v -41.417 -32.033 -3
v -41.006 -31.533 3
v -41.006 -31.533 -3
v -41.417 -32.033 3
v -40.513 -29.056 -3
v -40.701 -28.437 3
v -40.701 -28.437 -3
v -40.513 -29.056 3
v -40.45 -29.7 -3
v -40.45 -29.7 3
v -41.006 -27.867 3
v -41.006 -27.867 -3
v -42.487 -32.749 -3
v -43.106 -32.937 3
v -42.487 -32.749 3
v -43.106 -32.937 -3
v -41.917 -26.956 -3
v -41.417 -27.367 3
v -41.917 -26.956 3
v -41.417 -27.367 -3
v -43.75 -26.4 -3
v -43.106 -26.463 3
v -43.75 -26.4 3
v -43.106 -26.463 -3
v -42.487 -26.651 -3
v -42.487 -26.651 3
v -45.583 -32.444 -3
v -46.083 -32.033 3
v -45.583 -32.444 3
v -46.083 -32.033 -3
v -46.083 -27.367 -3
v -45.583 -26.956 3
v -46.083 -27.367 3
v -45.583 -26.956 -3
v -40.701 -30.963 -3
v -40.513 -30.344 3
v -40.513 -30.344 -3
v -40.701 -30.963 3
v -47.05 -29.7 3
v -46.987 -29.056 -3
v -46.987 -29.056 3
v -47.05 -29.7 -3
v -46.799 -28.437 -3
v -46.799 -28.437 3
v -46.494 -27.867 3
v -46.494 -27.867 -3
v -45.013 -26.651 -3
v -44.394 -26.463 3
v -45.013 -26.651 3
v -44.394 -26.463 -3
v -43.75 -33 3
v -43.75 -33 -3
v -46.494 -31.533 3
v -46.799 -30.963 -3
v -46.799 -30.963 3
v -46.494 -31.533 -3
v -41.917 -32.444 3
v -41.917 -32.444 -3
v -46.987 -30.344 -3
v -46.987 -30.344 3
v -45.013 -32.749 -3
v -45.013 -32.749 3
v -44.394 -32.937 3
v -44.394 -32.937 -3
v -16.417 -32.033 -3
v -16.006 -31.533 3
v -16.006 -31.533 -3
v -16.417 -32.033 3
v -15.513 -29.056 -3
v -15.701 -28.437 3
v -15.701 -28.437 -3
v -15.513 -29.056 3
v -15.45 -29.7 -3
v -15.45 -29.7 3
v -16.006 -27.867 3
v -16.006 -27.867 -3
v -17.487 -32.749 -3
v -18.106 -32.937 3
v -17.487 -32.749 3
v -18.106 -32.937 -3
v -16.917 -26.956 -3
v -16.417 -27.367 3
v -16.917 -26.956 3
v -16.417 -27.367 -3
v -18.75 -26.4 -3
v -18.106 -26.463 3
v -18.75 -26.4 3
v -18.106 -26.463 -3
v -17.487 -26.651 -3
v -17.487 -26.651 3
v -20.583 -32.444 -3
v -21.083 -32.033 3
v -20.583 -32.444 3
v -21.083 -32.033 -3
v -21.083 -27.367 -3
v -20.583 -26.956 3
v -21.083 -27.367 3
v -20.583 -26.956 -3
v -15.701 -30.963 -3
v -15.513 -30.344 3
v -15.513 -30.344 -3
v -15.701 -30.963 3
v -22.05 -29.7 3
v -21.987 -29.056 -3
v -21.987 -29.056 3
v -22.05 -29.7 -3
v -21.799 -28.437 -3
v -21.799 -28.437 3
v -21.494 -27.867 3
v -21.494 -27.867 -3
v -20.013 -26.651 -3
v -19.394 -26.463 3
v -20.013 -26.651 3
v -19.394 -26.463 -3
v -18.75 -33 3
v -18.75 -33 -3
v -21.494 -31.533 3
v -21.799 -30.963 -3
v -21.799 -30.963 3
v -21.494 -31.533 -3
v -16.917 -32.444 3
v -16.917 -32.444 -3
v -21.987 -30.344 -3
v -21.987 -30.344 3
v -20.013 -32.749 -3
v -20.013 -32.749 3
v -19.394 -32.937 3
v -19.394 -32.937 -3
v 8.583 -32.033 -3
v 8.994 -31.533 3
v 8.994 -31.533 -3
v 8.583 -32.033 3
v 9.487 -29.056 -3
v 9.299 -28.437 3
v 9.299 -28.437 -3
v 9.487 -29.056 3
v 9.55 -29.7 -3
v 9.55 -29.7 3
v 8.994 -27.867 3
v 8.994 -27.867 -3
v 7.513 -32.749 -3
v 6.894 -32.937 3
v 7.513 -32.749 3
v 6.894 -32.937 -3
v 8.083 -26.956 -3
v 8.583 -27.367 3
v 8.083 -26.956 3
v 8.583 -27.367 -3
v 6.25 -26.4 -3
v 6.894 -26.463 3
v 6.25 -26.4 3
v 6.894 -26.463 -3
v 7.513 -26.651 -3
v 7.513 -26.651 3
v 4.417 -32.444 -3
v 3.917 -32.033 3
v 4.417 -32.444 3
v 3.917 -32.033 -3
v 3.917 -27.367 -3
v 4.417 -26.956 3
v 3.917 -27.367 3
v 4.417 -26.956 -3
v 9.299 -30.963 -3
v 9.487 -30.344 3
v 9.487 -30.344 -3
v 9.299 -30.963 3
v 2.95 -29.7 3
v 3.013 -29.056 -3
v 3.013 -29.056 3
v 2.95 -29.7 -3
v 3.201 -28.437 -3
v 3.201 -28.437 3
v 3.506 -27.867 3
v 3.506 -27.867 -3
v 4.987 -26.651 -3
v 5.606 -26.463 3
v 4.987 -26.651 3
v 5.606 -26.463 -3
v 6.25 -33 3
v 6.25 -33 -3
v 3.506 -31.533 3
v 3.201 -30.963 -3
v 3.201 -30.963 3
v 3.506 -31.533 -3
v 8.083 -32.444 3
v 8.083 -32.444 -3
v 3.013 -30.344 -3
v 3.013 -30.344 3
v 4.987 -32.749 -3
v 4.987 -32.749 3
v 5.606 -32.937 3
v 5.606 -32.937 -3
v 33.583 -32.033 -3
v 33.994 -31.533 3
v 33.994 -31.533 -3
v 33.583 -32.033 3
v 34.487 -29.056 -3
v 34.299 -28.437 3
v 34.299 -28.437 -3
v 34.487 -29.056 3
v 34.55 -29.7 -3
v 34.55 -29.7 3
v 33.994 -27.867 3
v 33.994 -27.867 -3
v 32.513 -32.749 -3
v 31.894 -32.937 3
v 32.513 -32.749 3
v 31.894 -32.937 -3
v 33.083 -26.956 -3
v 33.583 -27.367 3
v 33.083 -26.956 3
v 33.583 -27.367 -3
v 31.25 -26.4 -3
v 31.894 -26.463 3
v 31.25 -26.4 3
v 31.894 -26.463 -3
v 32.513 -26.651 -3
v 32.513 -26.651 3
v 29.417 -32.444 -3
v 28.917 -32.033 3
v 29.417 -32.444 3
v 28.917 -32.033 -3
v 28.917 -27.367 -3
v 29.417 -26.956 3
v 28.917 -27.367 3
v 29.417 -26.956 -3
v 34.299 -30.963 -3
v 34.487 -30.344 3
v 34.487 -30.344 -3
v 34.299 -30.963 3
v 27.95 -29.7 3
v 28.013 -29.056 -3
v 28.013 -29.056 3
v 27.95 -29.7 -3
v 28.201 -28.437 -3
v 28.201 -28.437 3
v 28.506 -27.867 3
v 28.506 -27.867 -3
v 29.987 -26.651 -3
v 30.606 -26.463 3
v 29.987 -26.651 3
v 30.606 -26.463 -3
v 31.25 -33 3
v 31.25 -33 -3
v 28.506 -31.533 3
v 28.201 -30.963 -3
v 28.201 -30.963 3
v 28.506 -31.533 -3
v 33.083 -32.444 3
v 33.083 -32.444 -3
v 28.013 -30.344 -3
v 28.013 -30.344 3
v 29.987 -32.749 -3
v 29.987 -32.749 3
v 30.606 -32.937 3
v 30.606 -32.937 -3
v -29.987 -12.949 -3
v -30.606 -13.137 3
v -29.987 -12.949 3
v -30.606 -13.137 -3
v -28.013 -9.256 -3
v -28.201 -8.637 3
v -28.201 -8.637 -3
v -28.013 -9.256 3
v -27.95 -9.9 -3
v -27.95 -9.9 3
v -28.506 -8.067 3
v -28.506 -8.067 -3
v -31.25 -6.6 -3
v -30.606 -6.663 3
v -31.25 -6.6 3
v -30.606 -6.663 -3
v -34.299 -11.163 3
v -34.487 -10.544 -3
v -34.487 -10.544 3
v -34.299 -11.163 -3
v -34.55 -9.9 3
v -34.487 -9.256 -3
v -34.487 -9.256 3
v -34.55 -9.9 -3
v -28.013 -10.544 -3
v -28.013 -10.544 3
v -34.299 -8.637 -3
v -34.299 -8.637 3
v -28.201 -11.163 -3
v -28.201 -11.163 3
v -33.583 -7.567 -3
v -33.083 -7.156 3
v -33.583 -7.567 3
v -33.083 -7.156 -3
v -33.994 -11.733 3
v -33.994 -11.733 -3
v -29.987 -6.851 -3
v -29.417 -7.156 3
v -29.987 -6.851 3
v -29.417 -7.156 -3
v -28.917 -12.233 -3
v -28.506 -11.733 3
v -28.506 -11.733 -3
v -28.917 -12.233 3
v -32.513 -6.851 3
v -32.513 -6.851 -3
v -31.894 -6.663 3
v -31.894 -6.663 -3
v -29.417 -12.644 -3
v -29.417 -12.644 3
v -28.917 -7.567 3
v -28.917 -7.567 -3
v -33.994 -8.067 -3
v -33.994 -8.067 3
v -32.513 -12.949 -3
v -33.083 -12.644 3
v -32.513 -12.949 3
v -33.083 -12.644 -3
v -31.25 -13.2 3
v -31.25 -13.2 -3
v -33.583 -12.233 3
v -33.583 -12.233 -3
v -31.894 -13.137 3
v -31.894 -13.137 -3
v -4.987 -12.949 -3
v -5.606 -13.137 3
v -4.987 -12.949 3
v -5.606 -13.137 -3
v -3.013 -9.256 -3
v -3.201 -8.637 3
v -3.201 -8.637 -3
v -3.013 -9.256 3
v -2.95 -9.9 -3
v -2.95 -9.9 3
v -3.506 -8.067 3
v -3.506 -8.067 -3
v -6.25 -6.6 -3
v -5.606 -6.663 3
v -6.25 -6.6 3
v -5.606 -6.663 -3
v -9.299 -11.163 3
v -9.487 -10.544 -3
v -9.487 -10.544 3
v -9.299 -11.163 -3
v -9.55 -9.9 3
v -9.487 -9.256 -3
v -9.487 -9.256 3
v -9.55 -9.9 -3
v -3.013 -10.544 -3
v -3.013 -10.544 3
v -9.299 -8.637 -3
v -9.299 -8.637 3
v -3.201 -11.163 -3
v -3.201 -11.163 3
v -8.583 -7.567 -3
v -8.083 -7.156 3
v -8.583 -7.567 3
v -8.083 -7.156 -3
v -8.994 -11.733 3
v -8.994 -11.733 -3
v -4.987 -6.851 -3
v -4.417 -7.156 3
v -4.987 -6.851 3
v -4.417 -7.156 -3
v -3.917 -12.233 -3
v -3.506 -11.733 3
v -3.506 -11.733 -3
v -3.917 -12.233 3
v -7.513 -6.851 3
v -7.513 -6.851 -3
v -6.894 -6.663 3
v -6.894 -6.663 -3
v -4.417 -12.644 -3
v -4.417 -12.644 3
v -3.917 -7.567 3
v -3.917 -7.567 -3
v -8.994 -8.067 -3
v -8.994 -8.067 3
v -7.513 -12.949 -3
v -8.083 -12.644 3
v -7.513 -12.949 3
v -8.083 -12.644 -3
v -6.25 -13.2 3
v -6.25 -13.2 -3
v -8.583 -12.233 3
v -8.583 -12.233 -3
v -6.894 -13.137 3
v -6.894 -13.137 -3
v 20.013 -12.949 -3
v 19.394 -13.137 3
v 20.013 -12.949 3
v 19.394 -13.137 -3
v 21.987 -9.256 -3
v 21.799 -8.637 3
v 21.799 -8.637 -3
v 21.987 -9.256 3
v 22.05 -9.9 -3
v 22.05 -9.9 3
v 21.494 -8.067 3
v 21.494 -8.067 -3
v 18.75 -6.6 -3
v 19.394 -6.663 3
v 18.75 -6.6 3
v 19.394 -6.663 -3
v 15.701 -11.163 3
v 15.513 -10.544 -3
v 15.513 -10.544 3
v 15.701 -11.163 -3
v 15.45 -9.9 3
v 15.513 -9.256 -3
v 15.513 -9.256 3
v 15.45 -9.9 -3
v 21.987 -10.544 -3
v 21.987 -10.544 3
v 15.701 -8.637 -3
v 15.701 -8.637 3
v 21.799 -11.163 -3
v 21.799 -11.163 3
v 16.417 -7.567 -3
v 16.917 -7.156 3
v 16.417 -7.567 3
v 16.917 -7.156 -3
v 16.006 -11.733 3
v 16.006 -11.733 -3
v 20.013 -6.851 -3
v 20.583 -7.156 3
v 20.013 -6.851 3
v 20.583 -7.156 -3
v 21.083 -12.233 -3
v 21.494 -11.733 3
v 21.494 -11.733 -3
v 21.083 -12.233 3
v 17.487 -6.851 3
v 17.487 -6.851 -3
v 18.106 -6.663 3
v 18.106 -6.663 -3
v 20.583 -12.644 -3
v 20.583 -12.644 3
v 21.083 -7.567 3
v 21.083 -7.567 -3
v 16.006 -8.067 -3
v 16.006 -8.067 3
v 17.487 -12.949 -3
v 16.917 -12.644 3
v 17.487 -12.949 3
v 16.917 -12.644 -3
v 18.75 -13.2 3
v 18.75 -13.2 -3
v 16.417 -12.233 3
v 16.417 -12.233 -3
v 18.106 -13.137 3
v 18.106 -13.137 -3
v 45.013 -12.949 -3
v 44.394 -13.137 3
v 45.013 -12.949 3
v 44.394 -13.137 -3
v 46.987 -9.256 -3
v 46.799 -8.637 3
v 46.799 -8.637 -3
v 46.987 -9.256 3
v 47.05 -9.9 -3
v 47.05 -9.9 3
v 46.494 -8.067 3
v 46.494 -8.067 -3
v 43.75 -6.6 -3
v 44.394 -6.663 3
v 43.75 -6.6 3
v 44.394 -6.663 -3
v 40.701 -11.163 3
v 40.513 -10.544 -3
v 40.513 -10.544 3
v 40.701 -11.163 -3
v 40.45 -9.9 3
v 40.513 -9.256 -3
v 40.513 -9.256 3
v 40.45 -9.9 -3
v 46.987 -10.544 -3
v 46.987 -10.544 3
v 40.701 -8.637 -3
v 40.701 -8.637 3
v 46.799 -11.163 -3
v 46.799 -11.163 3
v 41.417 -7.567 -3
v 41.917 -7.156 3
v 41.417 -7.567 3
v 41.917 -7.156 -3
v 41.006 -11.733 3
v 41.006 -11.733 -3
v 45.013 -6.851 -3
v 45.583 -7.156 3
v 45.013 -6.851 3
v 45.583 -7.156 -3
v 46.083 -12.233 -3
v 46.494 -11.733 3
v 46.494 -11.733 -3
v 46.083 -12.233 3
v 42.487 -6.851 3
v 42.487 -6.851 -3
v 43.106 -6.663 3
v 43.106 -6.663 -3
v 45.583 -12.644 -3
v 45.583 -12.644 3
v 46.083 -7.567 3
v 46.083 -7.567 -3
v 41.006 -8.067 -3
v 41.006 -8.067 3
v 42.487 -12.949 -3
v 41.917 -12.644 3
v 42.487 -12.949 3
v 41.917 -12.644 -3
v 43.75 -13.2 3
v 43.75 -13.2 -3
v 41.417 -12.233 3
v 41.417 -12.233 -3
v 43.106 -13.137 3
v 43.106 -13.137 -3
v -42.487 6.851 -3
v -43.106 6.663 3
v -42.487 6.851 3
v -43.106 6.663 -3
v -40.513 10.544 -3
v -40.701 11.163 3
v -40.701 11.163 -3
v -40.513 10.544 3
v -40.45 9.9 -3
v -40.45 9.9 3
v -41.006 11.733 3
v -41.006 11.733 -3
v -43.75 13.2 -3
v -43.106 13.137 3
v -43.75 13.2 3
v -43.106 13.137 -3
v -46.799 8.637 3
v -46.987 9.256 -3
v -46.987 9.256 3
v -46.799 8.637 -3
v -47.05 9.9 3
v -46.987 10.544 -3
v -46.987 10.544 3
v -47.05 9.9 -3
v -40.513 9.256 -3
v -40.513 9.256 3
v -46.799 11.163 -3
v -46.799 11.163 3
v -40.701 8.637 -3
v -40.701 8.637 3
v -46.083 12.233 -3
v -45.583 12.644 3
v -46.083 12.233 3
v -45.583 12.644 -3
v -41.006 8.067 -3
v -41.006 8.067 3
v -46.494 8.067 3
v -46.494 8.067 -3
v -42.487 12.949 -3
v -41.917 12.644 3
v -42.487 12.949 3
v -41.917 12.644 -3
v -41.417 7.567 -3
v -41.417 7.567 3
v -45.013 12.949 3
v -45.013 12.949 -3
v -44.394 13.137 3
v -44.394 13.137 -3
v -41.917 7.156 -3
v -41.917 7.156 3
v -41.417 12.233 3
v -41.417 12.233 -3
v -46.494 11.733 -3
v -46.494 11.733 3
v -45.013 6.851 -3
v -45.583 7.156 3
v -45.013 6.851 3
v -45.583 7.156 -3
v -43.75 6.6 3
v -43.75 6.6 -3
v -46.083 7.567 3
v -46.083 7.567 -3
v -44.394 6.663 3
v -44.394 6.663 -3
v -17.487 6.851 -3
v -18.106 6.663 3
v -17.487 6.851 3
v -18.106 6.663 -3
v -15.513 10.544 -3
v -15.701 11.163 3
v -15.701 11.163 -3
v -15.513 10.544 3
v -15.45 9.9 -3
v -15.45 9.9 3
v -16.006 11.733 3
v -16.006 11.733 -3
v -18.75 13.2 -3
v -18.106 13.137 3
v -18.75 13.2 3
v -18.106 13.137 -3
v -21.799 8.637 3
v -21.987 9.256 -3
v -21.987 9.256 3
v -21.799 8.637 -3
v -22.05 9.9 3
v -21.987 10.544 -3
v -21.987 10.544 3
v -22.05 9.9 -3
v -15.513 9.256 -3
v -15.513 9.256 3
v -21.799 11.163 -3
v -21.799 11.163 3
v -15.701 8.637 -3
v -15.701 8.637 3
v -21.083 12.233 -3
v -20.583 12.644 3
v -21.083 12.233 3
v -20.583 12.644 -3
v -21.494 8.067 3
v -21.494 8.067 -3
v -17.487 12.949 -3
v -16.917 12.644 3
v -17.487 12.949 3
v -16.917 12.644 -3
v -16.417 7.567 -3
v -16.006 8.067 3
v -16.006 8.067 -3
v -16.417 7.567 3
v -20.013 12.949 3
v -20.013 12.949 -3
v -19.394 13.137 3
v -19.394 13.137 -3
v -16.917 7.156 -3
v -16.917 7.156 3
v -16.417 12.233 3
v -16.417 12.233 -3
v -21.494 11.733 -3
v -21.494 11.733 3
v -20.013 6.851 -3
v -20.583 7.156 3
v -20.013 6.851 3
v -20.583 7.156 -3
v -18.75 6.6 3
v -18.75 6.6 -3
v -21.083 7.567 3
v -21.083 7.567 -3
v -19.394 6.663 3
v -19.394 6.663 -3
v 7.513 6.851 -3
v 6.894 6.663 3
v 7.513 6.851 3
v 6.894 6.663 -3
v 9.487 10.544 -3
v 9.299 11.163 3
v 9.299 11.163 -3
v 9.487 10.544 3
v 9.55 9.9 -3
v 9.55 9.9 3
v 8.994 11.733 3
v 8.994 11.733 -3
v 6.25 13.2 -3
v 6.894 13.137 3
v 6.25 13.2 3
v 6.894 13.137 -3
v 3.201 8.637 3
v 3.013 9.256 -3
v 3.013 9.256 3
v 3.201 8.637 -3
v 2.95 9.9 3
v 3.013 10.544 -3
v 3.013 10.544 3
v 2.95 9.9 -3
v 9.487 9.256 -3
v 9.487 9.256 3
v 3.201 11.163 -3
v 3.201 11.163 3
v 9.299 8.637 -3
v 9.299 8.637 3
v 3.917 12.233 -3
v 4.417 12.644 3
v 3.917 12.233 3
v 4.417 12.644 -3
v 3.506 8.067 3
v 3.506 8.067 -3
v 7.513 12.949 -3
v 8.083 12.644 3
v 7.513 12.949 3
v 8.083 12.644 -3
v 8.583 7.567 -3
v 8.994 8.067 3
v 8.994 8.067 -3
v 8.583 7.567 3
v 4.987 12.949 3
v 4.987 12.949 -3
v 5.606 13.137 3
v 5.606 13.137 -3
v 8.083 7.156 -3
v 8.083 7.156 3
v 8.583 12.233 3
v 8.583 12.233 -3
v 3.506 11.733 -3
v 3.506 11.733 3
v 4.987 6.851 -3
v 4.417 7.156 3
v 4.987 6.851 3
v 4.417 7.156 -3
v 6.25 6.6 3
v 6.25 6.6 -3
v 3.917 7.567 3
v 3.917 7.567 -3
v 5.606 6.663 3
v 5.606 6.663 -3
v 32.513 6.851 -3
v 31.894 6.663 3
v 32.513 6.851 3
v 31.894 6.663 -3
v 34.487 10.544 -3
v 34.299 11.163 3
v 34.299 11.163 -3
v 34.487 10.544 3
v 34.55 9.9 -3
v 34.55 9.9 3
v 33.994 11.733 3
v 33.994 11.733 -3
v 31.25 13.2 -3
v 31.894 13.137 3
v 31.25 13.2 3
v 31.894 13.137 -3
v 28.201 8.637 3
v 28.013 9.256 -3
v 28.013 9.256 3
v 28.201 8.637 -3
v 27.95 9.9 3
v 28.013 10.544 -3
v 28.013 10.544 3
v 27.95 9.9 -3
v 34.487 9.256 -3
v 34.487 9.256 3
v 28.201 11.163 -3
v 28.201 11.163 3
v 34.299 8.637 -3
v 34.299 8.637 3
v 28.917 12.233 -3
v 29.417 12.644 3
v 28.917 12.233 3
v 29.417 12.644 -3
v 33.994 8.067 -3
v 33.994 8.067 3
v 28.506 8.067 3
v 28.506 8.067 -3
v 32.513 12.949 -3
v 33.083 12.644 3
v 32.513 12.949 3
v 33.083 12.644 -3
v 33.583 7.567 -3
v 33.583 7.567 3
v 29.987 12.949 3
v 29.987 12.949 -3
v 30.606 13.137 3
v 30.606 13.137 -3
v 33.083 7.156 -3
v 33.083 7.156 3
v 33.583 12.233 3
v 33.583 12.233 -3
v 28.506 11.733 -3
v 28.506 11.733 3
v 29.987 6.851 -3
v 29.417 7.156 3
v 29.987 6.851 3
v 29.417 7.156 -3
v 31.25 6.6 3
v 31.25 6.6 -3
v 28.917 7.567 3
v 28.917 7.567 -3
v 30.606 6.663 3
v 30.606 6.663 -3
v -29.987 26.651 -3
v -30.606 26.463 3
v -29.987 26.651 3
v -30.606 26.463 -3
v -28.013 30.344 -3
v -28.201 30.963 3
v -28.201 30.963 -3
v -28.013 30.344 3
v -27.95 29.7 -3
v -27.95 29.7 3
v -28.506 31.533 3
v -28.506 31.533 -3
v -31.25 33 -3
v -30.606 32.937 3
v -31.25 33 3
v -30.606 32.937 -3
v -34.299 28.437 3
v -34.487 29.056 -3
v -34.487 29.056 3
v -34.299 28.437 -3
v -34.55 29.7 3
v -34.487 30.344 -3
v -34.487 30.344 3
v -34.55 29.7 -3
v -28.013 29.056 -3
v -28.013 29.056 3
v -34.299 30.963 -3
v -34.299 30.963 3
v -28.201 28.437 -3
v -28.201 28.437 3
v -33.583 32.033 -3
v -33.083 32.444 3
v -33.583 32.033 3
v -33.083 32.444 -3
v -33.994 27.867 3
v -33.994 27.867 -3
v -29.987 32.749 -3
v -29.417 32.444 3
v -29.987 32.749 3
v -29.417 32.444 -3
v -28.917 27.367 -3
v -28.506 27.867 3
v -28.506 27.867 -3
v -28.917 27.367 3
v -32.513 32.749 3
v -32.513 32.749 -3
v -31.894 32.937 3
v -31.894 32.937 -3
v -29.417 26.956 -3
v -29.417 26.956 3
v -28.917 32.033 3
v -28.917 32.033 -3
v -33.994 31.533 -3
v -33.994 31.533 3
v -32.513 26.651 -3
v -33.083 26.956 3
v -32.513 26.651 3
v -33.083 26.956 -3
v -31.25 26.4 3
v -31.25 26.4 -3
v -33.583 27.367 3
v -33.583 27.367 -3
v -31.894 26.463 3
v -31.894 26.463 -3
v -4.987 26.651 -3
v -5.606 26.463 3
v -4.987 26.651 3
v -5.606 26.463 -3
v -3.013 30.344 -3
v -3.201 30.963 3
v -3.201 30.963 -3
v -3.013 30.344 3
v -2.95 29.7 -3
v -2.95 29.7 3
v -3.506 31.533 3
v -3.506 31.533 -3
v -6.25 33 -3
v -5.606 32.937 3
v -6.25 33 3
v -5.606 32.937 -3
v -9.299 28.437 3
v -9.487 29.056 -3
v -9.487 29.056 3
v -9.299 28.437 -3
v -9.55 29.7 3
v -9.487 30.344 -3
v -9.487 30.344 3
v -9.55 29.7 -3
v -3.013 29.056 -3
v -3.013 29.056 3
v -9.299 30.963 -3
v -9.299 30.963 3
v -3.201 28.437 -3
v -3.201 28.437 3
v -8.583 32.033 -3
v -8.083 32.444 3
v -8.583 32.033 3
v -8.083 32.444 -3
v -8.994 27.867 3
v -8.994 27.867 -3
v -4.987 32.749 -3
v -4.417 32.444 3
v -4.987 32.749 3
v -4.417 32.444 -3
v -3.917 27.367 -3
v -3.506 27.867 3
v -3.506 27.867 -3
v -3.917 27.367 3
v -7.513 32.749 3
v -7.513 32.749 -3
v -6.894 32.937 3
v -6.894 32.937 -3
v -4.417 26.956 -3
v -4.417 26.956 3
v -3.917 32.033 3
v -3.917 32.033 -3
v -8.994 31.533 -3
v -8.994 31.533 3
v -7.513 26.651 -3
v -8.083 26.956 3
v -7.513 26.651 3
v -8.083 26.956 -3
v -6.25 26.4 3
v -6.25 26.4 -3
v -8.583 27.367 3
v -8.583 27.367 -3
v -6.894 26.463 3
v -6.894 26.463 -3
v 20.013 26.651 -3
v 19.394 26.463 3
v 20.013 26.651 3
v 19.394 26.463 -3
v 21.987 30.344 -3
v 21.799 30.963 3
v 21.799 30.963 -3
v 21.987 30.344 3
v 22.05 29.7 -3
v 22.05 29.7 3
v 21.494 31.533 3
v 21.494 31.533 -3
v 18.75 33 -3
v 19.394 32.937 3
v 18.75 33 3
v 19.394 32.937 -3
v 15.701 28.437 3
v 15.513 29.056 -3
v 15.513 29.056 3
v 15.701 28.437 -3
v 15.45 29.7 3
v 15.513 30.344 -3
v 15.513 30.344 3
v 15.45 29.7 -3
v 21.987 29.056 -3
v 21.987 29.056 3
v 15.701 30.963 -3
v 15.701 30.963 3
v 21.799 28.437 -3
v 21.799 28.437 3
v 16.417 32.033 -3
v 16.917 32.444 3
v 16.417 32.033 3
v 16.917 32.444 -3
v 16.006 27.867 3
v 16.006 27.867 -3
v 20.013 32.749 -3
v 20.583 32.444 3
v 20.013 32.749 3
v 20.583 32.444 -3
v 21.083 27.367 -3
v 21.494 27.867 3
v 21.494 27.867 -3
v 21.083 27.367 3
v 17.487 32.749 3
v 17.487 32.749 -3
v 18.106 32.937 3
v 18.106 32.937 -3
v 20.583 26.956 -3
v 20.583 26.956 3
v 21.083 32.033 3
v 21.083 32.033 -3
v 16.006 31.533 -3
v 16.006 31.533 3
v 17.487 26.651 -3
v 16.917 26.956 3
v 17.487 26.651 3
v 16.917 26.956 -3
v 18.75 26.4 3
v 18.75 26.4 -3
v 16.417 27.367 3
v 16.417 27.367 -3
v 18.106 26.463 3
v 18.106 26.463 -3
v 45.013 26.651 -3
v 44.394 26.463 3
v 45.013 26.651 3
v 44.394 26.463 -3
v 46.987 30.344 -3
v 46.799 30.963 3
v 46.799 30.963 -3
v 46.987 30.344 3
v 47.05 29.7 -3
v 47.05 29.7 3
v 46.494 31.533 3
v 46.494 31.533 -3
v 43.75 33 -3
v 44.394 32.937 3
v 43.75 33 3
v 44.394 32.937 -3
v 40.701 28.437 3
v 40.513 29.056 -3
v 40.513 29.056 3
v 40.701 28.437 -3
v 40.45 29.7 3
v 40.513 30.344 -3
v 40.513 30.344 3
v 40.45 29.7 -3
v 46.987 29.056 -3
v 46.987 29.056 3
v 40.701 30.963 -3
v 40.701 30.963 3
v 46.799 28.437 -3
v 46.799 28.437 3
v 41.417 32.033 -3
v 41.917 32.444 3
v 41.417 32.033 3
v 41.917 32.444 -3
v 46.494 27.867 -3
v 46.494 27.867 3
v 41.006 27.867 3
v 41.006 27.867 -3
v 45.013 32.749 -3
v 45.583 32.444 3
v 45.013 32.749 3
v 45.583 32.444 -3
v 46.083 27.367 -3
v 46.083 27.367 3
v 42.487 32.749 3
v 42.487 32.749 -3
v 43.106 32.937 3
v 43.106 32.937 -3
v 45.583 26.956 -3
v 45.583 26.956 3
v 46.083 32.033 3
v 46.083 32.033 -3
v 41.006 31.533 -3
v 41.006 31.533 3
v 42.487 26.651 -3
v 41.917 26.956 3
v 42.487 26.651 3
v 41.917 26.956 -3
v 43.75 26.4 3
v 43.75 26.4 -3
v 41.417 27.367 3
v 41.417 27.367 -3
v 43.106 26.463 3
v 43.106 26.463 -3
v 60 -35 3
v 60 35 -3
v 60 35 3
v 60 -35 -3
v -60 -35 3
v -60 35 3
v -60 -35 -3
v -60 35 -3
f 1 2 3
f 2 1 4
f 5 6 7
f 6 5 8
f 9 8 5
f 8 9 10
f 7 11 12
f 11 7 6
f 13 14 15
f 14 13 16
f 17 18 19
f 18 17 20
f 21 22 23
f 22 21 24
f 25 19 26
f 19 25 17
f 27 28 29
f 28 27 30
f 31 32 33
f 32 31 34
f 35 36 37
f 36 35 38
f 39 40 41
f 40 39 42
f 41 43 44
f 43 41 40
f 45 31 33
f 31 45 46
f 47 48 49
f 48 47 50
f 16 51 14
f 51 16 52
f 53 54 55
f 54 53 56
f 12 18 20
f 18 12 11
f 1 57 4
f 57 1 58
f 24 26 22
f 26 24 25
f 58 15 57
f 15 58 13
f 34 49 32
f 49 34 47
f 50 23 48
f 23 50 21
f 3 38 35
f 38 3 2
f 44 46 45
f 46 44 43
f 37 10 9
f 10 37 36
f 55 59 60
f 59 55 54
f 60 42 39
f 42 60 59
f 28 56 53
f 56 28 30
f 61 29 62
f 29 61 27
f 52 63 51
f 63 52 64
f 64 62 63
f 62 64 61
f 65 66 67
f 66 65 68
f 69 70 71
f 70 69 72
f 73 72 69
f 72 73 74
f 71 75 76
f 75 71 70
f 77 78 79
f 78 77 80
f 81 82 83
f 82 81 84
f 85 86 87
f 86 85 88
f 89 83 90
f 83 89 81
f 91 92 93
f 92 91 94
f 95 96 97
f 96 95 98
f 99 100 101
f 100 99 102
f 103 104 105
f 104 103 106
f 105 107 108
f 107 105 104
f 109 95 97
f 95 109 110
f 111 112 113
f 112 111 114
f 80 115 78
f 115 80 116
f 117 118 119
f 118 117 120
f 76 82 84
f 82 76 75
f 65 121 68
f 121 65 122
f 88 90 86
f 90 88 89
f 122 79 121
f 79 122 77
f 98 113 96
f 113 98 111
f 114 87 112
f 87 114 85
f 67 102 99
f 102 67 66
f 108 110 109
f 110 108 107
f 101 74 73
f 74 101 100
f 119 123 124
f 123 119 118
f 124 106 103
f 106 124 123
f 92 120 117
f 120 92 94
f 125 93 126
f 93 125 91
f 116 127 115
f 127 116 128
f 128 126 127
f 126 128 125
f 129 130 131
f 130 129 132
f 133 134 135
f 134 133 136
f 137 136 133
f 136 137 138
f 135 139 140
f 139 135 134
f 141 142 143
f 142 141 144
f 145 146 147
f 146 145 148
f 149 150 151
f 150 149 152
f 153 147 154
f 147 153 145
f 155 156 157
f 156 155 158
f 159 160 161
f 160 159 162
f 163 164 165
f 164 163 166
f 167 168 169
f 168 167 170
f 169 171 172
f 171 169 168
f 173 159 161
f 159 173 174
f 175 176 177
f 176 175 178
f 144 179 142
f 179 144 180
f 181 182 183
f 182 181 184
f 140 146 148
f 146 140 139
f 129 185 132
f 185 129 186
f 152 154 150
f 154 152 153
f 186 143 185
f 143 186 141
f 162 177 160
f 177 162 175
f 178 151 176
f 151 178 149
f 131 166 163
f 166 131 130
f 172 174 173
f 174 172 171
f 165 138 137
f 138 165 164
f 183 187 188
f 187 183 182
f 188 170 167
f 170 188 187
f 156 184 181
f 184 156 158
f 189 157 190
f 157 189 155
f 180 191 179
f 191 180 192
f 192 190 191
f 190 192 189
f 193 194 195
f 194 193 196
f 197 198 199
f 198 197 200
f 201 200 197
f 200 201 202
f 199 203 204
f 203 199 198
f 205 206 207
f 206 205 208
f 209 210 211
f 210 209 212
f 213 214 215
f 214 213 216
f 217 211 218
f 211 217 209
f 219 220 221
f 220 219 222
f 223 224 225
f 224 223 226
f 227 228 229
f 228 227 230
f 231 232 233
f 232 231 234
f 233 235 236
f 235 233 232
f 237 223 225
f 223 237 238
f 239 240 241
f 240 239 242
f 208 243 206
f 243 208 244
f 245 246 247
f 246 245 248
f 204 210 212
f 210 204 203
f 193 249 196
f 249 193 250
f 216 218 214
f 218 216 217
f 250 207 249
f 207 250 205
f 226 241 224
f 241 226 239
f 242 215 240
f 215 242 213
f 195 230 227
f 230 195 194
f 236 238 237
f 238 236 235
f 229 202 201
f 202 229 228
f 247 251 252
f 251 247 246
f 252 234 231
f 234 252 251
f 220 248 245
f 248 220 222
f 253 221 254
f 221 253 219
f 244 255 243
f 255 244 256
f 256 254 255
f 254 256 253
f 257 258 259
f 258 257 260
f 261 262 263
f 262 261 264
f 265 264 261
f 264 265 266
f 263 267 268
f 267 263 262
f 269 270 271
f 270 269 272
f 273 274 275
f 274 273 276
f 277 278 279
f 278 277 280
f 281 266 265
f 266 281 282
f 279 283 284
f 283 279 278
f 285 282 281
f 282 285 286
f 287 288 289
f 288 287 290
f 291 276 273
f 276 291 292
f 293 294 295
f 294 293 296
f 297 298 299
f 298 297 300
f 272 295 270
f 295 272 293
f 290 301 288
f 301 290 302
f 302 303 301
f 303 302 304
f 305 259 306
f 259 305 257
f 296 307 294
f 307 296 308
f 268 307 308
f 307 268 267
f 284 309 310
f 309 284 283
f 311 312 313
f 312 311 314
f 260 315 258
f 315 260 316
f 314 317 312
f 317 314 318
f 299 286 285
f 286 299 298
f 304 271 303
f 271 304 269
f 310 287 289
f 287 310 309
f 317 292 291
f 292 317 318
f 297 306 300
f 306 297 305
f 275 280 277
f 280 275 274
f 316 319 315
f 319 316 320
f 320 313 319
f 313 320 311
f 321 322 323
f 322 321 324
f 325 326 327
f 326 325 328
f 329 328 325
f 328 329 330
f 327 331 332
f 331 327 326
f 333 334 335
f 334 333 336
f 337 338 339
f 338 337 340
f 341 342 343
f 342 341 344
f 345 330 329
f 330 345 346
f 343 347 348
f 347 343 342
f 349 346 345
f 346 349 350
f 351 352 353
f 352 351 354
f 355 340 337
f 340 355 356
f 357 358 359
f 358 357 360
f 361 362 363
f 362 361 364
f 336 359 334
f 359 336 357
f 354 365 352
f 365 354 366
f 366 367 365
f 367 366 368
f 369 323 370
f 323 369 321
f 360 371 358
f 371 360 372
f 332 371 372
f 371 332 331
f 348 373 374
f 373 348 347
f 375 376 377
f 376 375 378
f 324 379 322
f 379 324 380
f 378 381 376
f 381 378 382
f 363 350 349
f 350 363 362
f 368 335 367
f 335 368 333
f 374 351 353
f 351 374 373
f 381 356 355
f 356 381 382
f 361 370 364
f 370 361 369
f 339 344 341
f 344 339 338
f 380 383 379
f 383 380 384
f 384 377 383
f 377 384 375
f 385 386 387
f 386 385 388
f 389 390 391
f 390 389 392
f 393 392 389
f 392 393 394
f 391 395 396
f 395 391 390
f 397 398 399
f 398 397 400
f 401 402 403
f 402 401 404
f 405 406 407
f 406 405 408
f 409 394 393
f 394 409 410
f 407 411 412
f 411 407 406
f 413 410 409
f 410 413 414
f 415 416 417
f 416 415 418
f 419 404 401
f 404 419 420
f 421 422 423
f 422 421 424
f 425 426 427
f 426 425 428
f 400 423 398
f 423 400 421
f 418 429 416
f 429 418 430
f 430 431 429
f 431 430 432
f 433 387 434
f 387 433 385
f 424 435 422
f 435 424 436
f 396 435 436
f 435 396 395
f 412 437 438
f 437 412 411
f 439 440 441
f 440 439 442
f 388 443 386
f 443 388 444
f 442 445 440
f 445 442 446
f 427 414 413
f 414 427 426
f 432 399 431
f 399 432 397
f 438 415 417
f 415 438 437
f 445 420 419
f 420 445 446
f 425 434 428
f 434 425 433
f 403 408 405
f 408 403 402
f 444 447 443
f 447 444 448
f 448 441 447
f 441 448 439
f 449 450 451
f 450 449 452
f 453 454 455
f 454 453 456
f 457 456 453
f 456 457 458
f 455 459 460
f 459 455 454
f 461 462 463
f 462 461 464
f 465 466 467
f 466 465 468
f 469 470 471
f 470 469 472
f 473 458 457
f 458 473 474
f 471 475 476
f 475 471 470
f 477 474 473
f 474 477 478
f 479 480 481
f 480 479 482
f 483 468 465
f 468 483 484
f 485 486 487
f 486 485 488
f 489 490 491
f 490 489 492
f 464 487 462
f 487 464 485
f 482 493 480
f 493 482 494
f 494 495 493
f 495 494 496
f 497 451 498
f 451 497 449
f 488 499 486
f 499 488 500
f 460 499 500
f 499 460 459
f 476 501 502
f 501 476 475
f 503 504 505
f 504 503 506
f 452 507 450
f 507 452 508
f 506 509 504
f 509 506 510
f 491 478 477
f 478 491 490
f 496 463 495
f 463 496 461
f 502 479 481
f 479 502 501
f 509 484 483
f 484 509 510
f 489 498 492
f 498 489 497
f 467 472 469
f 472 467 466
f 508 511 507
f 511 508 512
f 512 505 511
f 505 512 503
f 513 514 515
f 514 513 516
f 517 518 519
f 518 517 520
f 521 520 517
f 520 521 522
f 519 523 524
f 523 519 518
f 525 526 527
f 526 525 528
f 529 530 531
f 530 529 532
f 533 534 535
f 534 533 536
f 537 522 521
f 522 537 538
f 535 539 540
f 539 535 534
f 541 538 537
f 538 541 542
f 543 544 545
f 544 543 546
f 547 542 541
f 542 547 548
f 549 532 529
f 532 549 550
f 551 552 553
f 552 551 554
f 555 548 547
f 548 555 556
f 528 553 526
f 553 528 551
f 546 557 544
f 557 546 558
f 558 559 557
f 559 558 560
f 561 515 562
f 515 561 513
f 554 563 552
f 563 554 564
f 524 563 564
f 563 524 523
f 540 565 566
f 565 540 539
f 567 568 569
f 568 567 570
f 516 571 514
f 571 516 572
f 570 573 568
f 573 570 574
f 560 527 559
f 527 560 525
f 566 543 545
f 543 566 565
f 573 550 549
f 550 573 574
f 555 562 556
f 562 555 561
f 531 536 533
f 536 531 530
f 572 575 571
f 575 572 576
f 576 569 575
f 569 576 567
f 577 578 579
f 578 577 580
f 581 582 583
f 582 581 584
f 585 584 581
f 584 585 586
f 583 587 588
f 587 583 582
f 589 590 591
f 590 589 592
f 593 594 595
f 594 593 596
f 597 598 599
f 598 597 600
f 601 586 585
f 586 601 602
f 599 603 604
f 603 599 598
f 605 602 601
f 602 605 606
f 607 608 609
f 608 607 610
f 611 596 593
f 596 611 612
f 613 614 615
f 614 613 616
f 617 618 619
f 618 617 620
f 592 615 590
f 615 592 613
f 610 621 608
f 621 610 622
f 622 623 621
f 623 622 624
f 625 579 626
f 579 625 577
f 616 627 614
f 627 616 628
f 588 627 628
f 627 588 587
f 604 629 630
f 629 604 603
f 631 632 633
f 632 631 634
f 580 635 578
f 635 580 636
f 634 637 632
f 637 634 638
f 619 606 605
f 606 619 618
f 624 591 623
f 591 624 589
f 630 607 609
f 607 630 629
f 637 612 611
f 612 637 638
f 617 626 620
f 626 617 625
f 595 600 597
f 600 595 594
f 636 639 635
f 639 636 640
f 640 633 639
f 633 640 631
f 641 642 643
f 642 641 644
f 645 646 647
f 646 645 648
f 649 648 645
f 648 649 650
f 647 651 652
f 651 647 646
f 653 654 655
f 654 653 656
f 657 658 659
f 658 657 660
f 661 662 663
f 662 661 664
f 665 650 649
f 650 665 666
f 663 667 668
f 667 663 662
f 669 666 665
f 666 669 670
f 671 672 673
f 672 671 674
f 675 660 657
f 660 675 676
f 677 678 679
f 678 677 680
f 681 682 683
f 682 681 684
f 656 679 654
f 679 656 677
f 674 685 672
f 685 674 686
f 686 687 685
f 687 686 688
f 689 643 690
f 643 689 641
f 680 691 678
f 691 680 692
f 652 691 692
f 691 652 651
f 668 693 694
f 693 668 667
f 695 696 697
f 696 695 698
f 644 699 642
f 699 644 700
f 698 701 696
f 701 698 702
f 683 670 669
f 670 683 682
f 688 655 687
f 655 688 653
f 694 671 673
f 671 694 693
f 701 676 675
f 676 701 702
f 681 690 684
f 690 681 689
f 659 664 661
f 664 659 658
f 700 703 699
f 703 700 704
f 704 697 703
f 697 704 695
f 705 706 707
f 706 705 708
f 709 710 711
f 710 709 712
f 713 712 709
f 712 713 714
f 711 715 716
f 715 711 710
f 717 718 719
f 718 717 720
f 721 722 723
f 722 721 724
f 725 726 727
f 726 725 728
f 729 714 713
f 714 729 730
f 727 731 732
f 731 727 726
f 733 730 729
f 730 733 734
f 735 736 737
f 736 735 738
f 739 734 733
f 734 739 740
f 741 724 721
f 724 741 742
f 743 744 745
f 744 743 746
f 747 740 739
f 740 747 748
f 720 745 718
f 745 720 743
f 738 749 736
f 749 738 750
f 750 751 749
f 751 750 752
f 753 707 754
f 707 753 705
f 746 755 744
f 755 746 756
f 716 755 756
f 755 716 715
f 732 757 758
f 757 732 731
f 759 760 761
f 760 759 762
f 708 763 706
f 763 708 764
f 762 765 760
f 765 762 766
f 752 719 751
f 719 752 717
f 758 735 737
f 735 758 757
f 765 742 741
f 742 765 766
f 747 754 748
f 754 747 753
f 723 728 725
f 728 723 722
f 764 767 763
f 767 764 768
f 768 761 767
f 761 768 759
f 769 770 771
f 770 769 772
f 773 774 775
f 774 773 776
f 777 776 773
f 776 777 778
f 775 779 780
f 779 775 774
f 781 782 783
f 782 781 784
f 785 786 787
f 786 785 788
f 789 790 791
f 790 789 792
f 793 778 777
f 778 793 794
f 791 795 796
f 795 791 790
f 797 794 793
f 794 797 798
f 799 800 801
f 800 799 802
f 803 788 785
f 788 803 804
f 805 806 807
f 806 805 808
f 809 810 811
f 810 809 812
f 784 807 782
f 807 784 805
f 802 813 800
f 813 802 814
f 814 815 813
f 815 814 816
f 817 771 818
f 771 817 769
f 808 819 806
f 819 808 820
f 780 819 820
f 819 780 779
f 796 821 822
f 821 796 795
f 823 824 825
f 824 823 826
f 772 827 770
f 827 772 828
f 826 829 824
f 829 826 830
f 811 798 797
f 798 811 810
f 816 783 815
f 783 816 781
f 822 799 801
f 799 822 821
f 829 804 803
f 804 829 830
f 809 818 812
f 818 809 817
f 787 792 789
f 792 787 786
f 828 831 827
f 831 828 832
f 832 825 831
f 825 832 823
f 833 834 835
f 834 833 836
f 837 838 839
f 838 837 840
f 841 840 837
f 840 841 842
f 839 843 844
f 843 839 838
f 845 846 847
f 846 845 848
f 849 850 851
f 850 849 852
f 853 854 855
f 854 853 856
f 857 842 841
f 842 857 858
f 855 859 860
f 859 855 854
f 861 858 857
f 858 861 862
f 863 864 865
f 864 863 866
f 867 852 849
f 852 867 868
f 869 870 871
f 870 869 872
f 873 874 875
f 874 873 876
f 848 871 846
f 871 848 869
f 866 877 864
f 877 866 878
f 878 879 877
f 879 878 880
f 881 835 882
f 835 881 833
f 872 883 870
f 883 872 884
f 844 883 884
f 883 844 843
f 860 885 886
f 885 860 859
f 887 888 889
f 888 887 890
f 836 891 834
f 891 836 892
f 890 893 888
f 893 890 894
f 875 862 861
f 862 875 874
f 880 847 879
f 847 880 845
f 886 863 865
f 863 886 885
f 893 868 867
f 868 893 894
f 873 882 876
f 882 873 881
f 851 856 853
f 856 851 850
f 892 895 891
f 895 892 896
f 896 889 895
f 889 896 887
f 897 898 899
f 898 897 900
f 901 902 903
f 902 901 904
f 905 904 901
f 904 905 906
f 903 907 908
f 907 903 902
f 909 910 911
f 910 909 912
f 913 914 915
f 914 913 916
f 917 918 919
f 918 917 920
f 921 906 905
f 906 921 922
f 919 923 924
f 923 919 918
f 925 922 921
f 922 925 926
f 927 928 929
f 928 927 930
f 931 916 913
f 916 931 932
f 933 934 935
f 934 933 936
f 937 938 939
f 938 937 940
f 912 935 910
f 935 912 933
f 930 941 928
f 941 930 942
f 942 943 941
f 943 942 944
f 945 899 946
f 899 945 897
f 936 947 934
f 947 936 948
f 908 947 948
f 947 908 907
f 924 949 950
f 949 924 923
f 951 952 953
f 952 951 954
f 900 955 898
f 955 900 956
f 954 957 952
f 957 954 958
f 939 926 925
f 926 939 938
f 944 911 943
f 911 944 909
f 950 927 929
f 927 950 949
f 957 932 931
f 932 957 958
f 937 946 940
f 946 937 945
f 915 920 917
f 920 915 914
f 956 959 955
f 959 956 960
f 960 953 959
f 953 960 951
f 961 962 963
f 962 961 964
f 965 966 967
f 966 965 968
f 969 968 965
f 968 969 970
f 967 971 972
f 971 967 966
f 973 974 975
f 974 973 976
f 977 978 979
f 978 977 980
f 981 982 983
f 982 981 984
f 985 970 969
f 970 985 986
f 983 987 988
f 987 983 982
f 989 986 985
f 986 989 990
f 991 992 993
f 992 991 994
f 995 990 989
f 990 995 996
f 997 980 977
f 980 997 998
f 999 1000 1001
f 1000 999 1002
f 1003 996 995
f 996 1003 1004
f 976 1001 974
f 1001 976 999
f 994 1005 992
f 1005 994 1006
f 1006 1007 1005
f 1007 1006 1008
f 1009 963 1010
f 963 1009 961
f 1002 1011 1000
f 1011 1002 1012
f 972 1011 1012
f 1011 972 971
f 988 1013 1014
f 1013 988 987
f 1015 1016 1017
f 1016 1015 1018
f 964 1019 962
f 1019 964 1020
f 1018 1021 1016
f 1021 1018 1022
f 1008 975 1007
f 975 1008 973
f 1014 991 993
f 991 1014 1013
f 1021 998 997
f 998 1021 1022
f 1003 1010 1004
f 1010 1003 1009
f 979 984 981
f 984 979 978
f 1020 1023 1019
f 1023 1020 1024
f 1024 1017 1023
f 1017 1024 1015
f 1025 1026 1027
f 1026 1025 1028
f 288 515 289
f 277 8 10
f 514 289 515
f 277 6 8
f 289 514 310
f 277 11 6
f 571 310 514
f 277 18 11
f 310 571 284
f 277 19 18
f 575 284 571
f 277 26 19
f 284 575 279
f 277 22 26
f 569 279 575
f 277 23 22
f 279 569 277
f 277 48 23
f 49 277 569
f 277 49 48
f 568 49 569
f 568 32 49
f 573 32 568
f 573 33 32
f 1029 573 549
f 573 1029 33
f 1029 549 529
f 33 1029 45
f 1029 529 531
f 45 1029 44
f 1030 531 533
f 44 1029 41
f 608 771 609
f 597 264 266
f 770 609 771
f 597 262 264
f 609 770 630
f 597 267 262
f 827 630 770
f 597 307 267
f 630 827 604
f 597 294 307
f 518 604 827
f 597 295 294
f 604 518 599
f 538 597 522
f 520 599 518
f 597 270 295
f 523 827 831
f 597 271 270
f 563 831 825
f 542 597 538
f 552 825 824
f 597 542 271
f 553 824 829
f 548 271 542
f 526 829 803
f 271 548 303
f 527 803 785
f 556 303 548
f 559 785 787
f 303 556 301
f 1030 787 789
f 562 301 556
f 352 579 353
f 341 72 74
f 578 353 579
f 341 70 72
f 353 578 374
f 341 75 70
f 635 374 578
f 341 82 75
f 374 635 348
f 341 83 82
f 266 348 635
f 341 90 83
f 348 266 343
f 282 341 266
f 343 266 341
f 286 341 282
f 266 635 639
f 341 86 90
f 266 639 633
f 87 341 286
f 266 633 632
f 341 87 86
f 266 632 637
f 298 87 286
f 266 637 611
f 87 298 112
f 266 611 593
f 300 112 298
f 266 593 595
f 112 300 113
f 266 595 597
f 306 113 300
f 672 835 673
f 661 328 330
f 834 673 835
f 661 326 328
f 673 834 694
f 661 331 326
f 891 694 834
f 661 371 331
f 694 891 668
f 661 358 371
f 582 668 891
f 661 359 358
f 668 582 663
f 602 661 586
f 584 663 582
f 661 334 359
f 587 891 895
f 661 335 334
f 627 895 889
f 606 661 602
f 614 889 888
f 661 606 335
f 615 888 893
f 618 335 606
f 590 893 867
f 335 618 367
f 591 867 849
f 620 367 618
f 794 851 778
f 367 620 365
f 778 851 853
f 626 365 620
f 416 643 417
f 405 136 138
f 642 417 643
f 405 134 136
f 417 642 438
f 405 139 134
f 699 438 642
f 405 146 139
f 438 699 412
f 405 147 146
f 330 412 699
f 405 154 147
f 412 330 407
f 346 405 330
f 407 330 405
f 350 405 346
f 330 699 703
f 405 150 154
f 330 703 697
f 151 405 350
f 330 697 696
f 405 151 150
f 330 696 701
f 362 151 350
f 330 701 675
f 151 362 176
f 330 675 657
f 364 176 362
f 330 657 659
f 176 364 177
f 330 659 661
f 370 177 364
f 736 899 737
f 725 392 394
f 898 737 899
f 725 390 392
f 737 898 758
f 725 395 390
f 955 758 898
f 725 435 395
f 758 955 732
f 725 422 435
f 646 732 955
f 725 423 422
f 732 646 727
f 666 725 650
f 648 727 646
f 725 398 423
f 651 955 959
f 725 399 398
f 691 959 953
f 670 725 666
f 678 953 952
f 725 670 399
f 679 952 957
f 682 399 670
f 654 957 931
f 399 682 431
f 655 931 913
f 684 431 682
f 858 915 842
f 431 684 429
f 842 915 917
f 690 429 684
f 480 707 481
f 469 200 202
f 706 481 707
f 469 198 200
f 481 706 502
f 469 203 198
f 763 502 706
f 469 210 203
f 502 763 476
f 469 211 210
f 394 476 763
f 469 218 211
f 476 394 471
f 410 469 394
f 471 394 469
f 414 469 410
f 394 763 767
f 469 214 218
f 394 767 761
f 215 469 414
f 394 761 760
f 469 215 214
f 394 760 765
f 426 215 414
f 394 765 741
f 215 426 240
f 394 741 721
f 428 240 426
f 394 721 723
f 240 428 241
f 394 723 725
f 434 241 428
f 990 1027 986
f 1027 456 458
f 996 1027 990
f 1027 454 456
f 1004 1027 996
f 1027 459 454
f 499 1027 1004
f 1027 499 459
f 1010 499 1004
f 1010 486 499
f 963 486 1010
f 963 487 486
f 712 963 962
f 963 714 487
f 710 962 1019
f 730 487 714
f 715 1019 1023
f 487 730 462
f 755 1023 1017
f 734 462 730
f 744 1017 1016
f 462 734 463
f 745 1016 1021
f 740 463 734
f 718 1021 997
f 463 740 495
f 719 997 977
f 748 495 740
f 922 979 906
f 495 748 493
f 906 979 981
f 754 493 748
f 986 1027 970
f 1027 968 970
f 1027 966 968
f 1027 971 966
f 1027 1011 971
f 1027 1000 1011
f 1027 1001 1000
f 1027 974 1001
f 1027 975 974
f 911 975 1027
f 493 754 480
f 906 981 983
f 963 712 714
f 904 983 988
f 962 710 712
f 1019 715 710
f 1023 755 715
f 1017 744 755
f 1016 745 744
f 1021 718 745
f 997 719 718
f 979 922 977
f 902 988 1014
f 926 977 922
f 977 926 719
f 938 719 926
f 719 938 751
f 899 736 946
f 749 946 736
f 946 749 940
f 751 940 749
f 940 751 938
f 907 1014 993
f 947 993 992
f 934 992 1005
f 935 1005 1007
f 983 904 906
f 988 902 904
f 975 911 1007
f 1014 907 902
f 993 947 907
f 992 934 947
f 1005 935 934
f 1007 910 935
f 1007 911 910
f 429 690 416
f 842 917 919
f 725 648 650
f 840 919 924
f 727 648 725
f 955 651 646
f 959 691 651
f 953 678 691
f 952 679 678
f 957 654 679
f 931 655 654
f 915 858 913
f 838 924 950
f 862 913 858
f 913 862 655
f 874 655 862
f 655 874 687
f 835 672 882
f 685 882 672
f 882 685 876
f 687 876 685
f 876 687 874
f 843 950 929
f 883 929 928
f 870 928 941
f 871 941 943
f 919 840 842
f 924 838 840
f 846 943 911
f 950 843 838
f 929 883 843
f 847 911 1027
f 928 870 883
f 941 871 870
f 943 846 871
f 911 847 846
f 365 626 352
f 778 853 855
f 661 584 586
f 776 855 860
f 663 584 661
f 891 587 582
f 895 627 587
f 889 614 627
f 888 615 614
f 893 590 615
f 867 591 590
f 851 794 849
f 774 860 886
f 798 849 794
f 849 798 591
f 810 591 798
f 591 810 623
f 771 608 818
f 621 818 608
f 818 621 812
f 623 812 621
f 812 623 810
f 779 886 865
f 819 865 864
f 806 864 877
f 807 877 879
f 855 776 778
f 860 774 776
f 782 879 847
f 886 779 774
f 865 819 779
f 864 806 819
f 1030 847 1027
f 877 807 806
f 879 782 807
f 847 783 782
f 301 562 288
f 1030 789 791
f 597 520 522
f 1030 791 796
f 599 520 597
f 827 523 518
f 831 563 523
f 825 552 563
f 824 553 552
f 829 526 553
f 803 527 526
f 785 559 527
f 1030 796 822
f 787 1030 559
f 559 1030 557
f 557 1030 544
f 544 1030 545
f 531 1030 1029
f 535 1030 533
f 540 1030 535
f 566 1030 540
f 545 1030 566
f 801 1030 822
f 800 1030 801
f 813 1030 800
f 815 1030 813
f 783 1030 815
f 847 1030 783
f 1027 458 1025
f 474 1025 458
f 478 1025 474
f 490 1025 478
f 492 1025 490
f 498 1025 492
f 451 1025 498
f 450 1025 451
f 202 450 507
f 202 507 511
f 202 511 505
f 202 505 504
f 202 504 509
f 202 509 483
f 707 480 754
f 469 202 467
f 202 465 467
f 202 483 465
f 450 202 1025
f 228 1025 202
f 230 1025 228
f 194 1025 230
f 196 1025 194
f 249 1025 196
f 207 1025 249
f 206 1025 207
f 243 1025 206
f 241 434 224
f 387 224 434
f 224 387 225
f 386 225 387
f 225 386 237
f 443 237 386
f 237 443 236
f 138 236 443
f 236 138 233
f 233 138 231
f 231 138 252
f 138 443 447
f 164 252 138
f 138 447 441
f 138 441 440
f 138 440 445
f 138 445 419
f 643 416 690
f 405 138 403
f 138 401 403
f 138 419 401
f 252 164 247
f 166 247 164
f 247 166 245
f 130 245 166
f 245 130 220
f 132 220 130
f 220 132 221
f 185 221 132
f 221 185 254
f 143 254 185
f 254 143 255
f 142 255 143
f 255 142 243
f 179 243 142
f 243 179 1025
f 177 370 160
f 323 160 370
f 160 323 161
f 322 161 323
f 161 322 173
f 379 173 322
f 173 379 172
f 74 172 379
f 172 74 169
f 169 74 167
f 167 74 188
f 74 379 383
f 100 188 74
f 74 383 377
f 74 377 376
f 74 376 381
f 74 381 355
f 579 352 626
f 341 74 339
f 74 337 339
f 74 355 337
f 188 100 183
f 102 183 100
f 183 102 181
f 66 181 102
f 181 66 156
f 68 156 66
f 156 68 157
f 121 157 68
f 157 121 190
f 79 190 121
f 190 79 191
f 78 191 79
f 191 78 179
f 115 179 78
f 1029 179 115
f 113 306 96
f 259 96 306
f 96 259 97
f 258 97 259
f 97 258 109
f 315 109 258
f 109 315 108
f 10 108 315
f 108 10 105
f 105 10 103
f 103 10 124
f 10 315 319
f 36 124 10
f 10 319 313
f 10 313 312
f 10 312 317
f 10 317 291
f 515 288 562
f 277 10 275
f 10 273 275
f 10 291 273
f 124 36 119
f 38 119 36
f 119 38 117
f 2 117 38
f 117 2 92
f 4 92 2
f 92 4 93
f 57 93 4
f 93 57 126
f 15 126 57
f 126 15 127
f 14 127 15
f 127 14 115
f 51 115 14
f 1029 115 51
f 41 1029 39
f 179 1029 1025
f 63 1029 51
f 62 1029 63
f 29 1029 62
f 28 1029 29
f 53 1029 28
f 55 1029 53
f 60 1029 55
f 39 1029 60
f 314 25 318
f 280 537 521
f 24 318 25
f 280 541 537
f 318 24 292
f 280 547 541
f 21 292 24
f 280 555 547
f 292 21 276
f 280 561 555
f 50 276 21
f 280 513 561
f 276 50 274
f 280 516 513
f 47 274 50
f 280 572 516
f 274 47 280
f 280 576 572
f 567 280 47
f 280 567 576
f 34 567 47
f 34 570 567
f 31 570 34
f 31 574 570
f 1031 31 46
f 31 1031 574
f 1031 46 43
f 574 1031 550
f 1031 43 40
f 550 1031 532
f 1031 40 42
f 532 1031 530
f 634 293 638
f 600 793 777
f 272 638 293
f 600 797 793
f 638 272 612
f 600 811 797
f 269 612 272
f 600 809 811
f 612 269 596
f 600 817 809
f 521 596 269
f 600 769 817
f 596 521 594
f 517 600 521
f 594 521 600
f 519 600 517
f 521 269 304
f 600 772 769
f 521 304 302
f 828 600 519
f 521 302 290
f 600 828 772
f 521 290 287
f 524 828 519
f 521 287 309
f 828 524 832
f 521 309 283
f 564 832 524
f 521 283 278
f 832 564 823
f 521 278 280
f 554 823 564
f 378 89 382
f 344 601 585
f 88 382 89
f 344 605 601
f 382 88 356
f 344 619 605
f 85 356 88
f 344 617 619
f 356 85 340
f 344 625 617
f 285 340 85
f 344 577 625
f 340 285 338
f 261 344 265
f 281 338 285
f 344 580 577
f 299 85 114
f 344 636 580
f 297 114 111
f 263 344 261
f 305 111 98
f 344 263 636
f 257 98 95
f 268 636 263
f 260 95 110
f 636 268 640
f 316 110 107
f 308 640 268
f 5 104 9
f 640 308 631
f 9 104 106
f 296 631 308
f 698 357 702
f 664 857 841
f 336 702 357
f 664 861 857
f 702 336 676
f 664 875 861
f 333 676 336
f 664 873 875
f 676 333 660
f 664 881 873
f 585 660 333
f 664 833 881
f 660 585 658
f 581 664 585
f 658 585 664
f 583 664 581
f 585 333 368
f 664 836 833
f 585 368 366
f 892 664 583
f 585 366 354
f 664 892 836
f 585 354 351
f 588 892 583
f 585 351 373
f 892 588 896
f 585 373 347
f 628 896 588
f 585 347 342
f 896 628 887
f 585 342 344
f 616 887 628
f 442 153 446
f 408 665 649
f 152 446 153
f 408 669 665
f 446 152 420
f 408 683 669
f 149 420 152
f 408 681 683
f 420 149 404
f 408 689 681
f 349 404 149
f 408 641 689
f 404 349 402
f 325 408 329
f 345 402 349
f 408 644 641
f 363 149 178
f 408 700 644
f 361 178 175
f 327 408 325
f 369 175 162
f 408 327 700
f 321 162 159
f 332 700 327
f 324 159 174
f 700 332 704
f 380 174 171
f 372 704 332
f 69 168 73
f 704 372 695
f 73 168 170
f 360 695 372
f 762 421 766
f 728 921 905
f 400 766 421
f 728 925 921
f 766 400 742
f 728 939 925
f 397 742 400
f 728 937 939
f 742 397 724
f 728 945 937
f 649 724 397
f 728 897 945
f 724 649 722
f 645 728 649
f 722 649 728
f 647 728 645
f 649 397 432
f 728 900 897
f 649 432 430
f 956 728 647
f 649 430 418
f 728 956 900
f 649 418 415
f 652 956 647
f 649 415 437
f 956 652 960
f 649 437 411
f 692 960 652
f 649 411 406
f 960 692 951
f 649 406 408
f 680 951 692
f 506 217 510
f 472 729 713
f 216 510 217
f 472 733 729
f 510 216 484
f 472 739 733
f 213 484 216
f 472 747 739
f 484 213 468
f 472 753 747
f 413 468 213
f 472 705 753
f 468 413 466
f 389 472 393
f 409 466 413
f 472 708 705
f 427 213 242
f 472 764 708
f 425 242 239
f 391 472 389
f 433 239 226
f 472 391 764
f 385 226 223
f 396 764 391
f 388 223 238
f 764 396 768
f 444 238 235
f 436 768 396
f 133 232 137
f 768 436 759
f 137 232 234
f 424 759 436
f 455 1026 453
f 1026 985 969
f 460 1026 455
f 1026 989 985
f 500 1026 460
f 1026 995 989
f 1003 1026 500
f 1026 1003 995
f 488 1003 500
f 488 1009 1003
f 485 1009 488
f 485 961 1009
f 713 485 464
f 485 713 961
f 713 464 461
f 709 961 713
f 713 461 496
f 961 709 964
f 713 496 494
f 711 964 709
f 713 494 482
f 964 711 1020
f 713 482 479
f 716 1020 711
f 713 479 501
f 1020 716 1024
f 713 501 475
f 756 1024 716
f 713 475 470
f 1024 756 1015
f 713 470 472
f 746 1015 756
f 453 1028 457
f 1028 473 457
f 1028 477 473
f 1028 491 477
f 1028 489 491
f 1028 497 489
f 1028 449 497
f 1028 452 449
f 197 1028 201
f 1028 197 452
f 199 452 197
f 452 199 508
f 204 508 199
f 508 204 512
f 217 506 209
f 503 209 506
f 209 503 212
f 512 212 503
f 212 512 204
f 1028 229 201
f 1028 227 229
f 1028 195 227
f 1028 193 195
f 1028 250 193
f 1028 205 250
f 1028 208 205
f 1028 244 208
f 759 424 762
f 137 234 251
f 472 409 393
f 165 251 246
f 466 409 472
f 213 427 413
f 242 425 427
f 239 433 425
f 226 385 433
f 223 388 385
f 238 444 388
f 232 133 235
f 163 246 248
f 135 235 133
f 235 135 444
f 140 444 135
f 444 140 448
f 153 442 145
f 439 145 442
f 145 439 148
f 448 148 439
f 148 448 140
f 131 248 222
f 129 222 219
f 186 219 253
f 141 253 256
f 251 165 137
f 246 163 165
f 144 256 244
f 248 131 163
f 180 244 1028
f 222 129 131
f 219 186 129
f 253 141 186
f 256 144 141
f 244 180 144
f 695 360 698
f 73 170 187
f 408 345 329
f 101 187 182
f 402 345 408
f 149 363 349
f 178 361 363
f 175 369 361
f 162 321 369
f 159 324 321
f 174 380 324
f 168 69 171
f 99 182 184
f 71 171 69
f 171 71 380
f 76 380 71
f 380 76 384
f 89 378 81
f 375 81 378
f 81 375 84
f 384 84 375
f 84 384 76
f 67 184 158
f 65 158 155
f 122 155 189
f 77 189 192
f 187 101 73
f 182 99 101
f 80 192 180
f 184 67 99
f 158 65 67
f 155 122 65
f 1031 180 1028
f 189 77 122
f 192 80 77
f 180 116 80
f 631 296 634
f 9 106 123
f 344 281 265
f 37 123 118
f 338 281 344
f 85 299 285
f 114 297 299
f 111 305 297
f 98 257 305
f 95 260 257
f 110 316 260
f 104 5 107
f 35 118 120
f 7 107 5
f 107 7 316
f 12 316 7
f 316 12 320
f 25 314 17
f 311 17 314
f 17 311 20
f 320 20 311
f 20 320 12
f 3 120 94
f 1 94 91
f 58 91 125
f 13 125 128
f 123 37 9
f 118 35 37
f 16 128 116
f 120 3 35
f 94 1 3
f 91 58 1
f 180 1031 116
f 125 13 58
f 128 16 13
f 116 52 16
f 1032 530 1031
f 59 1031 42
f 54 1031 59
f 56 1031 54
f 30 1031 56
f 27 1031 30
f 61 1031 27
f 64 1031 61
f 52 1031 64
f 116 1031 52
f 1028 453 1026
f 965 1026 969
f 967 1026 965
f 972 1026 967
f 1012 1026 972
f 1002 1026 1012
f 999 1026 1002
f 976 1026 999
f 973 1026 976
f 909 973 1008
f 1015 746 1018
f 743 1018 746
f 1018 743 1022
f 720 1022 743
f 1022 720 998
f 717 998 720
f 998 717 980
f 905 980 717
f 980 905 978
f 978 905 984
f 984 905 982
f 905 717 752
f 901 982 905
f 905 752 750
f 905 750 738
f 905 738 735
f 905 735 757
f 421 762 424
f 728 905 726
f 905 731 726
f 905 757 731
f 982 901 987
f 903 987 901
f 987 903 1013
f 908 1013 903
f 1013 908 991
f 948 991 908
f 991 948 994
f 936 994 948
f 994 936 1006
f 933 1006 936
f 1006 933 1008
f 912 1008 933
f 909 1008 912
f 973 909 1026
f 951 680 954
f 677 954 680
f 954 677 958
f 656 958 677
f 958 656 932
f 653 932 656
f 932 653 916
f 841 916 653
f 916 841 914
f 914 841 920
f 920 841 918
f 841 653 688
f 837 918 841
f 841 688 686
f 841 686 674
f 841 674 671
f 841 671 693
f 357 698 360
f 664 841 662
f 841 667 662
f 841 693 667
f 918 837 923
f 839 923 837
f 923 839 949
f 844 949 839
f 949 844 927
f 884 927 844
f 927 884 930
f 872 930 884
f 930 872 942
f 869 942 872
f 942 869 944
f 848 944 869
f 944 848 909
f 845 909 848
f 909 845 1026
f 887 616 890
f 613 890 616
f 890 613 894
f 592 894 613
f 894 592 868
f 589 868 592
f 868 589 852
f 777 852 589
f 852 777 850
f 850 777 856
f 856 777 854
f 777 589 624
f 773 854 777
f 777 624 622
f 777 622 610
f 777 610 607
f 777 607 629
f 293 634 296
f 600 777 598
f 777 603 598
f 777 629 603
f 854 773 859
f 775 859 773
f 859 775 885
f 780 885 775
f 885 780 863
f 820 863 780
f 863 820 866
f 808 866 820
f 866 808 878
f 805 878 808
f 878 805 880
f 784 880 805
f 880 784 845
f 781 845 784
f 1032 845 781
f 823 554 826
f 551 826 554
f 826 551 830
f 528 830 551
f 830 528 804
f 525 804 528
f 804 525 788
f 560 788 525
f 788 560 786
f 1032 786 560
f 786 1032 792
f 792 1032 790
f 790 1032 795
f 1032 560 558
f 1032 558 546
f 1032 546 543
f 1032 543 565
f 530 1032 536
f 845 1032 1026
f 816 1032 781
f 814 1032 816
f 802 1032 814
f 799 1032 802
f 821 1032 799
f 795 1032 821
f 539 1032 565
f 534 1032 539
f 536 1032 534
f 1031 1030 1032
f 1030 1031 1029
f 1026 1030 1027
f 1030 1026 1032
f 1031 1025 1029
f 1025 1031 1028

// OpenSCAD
$fn = 32;

// ----------------------------------------------------------------------
// Perforated panel 120 x 70 x 6
// 4 x 4 Ø6.6 holes, checker layout
// ----------------------------------------------------------------------

// --- parameters (mm) ---
panel = [120, 70, 6];  // overall size (x, y, z)
hole_d = 6.6;          // hole diameter
pitch_x = 25;          // hole pitch along X
pitch_y = 19.8;        // hole pitch along Y

// --- derived feature positions (mm) ---
margin = hole_d / 2 + 2;            // = 5.3   clearance from the panel edge
row_offset = pitch_x / 2;           // = 12.5   shift of every other row
cols = floor((panel[0] - 2 * margin - row_offset) / pitch_x) + 1;  // = 4   how many columns fit in X
rows = floor((panel[1] - 2 * margin) / pitch_y) + 1;  // = 4   how many rows fit in Y
span_x = (cols - 1) * pitch_x + row_offset;  // = 87.5   width of the field
span_y = (rows - 1) * pitch_y;      // = 59.4   height of the field
origin_x = -span_x / 2;             // = -43.75   X of the first hole
origin_y = -span_y / 2;             // = -29.7   Y of the first row
holes = rows * cols;                // = 16   holes in total
feature_centers = [
  [origin_x + 0 * pitch_x, origin_y + 0 * pitch_y],
  [origin_x + 1 * pitch_x, origin_y + 0 * pitch_y],
  [origin_x + 2 * pitch_x, origin_y + 0 * pitch_y],
  [origin_x + 3 * pitch_x, origin_y + 0 * pitch_y],
  [origin_x + row_offset + 0 * pitch_x, origin_y + 1 * pitch_y],
  [origin_x + row_offset + 1 * pitch_x, origin_y + 1 * pitch_y],
  [origin_x + row_offset + 2 * pitch_x, origin_y + 1 * pitch_y],
  [origin_x + row_offset + 3 * pitch_x, origin_y + 1 * pitch_y],
  [origin_x + 0 * pitch_x, origin_y + 2 * pitch_y],
  [origin_x + 1 * pitch_x, origin_y + 2 * pitch_y],
  [origin_x + 2 * pitch_x, origin_y + 2 * pitch_y],
  [origin_x + 3 * pitch_x, origin_y + 2 * pitch_y],
  [origin_x + row_offset + 0 * pitch_x, origin_y + 3 * pitch_y],
  [origin_x + row_offset + 1 * pitch_x, origin_y + 3 * pitch_y],
  [origin_x + row_offset + 2 * pitch_x, origin_y + 3 * pitch_y],
  [origin_x + row_offset + 3 * pitch_x, origin_y + 3 * pitch_y]
];   // hole centres, used verbatim by the cutter loop

// panel outline, every hole through
difference() {
  cube(panel, center = true);
  for (centre = feature_centers)
    translate([centre[0], centre[1], 0])
      cylinder(d = hole_d, h = panel[2] + 2, center = true);
}
